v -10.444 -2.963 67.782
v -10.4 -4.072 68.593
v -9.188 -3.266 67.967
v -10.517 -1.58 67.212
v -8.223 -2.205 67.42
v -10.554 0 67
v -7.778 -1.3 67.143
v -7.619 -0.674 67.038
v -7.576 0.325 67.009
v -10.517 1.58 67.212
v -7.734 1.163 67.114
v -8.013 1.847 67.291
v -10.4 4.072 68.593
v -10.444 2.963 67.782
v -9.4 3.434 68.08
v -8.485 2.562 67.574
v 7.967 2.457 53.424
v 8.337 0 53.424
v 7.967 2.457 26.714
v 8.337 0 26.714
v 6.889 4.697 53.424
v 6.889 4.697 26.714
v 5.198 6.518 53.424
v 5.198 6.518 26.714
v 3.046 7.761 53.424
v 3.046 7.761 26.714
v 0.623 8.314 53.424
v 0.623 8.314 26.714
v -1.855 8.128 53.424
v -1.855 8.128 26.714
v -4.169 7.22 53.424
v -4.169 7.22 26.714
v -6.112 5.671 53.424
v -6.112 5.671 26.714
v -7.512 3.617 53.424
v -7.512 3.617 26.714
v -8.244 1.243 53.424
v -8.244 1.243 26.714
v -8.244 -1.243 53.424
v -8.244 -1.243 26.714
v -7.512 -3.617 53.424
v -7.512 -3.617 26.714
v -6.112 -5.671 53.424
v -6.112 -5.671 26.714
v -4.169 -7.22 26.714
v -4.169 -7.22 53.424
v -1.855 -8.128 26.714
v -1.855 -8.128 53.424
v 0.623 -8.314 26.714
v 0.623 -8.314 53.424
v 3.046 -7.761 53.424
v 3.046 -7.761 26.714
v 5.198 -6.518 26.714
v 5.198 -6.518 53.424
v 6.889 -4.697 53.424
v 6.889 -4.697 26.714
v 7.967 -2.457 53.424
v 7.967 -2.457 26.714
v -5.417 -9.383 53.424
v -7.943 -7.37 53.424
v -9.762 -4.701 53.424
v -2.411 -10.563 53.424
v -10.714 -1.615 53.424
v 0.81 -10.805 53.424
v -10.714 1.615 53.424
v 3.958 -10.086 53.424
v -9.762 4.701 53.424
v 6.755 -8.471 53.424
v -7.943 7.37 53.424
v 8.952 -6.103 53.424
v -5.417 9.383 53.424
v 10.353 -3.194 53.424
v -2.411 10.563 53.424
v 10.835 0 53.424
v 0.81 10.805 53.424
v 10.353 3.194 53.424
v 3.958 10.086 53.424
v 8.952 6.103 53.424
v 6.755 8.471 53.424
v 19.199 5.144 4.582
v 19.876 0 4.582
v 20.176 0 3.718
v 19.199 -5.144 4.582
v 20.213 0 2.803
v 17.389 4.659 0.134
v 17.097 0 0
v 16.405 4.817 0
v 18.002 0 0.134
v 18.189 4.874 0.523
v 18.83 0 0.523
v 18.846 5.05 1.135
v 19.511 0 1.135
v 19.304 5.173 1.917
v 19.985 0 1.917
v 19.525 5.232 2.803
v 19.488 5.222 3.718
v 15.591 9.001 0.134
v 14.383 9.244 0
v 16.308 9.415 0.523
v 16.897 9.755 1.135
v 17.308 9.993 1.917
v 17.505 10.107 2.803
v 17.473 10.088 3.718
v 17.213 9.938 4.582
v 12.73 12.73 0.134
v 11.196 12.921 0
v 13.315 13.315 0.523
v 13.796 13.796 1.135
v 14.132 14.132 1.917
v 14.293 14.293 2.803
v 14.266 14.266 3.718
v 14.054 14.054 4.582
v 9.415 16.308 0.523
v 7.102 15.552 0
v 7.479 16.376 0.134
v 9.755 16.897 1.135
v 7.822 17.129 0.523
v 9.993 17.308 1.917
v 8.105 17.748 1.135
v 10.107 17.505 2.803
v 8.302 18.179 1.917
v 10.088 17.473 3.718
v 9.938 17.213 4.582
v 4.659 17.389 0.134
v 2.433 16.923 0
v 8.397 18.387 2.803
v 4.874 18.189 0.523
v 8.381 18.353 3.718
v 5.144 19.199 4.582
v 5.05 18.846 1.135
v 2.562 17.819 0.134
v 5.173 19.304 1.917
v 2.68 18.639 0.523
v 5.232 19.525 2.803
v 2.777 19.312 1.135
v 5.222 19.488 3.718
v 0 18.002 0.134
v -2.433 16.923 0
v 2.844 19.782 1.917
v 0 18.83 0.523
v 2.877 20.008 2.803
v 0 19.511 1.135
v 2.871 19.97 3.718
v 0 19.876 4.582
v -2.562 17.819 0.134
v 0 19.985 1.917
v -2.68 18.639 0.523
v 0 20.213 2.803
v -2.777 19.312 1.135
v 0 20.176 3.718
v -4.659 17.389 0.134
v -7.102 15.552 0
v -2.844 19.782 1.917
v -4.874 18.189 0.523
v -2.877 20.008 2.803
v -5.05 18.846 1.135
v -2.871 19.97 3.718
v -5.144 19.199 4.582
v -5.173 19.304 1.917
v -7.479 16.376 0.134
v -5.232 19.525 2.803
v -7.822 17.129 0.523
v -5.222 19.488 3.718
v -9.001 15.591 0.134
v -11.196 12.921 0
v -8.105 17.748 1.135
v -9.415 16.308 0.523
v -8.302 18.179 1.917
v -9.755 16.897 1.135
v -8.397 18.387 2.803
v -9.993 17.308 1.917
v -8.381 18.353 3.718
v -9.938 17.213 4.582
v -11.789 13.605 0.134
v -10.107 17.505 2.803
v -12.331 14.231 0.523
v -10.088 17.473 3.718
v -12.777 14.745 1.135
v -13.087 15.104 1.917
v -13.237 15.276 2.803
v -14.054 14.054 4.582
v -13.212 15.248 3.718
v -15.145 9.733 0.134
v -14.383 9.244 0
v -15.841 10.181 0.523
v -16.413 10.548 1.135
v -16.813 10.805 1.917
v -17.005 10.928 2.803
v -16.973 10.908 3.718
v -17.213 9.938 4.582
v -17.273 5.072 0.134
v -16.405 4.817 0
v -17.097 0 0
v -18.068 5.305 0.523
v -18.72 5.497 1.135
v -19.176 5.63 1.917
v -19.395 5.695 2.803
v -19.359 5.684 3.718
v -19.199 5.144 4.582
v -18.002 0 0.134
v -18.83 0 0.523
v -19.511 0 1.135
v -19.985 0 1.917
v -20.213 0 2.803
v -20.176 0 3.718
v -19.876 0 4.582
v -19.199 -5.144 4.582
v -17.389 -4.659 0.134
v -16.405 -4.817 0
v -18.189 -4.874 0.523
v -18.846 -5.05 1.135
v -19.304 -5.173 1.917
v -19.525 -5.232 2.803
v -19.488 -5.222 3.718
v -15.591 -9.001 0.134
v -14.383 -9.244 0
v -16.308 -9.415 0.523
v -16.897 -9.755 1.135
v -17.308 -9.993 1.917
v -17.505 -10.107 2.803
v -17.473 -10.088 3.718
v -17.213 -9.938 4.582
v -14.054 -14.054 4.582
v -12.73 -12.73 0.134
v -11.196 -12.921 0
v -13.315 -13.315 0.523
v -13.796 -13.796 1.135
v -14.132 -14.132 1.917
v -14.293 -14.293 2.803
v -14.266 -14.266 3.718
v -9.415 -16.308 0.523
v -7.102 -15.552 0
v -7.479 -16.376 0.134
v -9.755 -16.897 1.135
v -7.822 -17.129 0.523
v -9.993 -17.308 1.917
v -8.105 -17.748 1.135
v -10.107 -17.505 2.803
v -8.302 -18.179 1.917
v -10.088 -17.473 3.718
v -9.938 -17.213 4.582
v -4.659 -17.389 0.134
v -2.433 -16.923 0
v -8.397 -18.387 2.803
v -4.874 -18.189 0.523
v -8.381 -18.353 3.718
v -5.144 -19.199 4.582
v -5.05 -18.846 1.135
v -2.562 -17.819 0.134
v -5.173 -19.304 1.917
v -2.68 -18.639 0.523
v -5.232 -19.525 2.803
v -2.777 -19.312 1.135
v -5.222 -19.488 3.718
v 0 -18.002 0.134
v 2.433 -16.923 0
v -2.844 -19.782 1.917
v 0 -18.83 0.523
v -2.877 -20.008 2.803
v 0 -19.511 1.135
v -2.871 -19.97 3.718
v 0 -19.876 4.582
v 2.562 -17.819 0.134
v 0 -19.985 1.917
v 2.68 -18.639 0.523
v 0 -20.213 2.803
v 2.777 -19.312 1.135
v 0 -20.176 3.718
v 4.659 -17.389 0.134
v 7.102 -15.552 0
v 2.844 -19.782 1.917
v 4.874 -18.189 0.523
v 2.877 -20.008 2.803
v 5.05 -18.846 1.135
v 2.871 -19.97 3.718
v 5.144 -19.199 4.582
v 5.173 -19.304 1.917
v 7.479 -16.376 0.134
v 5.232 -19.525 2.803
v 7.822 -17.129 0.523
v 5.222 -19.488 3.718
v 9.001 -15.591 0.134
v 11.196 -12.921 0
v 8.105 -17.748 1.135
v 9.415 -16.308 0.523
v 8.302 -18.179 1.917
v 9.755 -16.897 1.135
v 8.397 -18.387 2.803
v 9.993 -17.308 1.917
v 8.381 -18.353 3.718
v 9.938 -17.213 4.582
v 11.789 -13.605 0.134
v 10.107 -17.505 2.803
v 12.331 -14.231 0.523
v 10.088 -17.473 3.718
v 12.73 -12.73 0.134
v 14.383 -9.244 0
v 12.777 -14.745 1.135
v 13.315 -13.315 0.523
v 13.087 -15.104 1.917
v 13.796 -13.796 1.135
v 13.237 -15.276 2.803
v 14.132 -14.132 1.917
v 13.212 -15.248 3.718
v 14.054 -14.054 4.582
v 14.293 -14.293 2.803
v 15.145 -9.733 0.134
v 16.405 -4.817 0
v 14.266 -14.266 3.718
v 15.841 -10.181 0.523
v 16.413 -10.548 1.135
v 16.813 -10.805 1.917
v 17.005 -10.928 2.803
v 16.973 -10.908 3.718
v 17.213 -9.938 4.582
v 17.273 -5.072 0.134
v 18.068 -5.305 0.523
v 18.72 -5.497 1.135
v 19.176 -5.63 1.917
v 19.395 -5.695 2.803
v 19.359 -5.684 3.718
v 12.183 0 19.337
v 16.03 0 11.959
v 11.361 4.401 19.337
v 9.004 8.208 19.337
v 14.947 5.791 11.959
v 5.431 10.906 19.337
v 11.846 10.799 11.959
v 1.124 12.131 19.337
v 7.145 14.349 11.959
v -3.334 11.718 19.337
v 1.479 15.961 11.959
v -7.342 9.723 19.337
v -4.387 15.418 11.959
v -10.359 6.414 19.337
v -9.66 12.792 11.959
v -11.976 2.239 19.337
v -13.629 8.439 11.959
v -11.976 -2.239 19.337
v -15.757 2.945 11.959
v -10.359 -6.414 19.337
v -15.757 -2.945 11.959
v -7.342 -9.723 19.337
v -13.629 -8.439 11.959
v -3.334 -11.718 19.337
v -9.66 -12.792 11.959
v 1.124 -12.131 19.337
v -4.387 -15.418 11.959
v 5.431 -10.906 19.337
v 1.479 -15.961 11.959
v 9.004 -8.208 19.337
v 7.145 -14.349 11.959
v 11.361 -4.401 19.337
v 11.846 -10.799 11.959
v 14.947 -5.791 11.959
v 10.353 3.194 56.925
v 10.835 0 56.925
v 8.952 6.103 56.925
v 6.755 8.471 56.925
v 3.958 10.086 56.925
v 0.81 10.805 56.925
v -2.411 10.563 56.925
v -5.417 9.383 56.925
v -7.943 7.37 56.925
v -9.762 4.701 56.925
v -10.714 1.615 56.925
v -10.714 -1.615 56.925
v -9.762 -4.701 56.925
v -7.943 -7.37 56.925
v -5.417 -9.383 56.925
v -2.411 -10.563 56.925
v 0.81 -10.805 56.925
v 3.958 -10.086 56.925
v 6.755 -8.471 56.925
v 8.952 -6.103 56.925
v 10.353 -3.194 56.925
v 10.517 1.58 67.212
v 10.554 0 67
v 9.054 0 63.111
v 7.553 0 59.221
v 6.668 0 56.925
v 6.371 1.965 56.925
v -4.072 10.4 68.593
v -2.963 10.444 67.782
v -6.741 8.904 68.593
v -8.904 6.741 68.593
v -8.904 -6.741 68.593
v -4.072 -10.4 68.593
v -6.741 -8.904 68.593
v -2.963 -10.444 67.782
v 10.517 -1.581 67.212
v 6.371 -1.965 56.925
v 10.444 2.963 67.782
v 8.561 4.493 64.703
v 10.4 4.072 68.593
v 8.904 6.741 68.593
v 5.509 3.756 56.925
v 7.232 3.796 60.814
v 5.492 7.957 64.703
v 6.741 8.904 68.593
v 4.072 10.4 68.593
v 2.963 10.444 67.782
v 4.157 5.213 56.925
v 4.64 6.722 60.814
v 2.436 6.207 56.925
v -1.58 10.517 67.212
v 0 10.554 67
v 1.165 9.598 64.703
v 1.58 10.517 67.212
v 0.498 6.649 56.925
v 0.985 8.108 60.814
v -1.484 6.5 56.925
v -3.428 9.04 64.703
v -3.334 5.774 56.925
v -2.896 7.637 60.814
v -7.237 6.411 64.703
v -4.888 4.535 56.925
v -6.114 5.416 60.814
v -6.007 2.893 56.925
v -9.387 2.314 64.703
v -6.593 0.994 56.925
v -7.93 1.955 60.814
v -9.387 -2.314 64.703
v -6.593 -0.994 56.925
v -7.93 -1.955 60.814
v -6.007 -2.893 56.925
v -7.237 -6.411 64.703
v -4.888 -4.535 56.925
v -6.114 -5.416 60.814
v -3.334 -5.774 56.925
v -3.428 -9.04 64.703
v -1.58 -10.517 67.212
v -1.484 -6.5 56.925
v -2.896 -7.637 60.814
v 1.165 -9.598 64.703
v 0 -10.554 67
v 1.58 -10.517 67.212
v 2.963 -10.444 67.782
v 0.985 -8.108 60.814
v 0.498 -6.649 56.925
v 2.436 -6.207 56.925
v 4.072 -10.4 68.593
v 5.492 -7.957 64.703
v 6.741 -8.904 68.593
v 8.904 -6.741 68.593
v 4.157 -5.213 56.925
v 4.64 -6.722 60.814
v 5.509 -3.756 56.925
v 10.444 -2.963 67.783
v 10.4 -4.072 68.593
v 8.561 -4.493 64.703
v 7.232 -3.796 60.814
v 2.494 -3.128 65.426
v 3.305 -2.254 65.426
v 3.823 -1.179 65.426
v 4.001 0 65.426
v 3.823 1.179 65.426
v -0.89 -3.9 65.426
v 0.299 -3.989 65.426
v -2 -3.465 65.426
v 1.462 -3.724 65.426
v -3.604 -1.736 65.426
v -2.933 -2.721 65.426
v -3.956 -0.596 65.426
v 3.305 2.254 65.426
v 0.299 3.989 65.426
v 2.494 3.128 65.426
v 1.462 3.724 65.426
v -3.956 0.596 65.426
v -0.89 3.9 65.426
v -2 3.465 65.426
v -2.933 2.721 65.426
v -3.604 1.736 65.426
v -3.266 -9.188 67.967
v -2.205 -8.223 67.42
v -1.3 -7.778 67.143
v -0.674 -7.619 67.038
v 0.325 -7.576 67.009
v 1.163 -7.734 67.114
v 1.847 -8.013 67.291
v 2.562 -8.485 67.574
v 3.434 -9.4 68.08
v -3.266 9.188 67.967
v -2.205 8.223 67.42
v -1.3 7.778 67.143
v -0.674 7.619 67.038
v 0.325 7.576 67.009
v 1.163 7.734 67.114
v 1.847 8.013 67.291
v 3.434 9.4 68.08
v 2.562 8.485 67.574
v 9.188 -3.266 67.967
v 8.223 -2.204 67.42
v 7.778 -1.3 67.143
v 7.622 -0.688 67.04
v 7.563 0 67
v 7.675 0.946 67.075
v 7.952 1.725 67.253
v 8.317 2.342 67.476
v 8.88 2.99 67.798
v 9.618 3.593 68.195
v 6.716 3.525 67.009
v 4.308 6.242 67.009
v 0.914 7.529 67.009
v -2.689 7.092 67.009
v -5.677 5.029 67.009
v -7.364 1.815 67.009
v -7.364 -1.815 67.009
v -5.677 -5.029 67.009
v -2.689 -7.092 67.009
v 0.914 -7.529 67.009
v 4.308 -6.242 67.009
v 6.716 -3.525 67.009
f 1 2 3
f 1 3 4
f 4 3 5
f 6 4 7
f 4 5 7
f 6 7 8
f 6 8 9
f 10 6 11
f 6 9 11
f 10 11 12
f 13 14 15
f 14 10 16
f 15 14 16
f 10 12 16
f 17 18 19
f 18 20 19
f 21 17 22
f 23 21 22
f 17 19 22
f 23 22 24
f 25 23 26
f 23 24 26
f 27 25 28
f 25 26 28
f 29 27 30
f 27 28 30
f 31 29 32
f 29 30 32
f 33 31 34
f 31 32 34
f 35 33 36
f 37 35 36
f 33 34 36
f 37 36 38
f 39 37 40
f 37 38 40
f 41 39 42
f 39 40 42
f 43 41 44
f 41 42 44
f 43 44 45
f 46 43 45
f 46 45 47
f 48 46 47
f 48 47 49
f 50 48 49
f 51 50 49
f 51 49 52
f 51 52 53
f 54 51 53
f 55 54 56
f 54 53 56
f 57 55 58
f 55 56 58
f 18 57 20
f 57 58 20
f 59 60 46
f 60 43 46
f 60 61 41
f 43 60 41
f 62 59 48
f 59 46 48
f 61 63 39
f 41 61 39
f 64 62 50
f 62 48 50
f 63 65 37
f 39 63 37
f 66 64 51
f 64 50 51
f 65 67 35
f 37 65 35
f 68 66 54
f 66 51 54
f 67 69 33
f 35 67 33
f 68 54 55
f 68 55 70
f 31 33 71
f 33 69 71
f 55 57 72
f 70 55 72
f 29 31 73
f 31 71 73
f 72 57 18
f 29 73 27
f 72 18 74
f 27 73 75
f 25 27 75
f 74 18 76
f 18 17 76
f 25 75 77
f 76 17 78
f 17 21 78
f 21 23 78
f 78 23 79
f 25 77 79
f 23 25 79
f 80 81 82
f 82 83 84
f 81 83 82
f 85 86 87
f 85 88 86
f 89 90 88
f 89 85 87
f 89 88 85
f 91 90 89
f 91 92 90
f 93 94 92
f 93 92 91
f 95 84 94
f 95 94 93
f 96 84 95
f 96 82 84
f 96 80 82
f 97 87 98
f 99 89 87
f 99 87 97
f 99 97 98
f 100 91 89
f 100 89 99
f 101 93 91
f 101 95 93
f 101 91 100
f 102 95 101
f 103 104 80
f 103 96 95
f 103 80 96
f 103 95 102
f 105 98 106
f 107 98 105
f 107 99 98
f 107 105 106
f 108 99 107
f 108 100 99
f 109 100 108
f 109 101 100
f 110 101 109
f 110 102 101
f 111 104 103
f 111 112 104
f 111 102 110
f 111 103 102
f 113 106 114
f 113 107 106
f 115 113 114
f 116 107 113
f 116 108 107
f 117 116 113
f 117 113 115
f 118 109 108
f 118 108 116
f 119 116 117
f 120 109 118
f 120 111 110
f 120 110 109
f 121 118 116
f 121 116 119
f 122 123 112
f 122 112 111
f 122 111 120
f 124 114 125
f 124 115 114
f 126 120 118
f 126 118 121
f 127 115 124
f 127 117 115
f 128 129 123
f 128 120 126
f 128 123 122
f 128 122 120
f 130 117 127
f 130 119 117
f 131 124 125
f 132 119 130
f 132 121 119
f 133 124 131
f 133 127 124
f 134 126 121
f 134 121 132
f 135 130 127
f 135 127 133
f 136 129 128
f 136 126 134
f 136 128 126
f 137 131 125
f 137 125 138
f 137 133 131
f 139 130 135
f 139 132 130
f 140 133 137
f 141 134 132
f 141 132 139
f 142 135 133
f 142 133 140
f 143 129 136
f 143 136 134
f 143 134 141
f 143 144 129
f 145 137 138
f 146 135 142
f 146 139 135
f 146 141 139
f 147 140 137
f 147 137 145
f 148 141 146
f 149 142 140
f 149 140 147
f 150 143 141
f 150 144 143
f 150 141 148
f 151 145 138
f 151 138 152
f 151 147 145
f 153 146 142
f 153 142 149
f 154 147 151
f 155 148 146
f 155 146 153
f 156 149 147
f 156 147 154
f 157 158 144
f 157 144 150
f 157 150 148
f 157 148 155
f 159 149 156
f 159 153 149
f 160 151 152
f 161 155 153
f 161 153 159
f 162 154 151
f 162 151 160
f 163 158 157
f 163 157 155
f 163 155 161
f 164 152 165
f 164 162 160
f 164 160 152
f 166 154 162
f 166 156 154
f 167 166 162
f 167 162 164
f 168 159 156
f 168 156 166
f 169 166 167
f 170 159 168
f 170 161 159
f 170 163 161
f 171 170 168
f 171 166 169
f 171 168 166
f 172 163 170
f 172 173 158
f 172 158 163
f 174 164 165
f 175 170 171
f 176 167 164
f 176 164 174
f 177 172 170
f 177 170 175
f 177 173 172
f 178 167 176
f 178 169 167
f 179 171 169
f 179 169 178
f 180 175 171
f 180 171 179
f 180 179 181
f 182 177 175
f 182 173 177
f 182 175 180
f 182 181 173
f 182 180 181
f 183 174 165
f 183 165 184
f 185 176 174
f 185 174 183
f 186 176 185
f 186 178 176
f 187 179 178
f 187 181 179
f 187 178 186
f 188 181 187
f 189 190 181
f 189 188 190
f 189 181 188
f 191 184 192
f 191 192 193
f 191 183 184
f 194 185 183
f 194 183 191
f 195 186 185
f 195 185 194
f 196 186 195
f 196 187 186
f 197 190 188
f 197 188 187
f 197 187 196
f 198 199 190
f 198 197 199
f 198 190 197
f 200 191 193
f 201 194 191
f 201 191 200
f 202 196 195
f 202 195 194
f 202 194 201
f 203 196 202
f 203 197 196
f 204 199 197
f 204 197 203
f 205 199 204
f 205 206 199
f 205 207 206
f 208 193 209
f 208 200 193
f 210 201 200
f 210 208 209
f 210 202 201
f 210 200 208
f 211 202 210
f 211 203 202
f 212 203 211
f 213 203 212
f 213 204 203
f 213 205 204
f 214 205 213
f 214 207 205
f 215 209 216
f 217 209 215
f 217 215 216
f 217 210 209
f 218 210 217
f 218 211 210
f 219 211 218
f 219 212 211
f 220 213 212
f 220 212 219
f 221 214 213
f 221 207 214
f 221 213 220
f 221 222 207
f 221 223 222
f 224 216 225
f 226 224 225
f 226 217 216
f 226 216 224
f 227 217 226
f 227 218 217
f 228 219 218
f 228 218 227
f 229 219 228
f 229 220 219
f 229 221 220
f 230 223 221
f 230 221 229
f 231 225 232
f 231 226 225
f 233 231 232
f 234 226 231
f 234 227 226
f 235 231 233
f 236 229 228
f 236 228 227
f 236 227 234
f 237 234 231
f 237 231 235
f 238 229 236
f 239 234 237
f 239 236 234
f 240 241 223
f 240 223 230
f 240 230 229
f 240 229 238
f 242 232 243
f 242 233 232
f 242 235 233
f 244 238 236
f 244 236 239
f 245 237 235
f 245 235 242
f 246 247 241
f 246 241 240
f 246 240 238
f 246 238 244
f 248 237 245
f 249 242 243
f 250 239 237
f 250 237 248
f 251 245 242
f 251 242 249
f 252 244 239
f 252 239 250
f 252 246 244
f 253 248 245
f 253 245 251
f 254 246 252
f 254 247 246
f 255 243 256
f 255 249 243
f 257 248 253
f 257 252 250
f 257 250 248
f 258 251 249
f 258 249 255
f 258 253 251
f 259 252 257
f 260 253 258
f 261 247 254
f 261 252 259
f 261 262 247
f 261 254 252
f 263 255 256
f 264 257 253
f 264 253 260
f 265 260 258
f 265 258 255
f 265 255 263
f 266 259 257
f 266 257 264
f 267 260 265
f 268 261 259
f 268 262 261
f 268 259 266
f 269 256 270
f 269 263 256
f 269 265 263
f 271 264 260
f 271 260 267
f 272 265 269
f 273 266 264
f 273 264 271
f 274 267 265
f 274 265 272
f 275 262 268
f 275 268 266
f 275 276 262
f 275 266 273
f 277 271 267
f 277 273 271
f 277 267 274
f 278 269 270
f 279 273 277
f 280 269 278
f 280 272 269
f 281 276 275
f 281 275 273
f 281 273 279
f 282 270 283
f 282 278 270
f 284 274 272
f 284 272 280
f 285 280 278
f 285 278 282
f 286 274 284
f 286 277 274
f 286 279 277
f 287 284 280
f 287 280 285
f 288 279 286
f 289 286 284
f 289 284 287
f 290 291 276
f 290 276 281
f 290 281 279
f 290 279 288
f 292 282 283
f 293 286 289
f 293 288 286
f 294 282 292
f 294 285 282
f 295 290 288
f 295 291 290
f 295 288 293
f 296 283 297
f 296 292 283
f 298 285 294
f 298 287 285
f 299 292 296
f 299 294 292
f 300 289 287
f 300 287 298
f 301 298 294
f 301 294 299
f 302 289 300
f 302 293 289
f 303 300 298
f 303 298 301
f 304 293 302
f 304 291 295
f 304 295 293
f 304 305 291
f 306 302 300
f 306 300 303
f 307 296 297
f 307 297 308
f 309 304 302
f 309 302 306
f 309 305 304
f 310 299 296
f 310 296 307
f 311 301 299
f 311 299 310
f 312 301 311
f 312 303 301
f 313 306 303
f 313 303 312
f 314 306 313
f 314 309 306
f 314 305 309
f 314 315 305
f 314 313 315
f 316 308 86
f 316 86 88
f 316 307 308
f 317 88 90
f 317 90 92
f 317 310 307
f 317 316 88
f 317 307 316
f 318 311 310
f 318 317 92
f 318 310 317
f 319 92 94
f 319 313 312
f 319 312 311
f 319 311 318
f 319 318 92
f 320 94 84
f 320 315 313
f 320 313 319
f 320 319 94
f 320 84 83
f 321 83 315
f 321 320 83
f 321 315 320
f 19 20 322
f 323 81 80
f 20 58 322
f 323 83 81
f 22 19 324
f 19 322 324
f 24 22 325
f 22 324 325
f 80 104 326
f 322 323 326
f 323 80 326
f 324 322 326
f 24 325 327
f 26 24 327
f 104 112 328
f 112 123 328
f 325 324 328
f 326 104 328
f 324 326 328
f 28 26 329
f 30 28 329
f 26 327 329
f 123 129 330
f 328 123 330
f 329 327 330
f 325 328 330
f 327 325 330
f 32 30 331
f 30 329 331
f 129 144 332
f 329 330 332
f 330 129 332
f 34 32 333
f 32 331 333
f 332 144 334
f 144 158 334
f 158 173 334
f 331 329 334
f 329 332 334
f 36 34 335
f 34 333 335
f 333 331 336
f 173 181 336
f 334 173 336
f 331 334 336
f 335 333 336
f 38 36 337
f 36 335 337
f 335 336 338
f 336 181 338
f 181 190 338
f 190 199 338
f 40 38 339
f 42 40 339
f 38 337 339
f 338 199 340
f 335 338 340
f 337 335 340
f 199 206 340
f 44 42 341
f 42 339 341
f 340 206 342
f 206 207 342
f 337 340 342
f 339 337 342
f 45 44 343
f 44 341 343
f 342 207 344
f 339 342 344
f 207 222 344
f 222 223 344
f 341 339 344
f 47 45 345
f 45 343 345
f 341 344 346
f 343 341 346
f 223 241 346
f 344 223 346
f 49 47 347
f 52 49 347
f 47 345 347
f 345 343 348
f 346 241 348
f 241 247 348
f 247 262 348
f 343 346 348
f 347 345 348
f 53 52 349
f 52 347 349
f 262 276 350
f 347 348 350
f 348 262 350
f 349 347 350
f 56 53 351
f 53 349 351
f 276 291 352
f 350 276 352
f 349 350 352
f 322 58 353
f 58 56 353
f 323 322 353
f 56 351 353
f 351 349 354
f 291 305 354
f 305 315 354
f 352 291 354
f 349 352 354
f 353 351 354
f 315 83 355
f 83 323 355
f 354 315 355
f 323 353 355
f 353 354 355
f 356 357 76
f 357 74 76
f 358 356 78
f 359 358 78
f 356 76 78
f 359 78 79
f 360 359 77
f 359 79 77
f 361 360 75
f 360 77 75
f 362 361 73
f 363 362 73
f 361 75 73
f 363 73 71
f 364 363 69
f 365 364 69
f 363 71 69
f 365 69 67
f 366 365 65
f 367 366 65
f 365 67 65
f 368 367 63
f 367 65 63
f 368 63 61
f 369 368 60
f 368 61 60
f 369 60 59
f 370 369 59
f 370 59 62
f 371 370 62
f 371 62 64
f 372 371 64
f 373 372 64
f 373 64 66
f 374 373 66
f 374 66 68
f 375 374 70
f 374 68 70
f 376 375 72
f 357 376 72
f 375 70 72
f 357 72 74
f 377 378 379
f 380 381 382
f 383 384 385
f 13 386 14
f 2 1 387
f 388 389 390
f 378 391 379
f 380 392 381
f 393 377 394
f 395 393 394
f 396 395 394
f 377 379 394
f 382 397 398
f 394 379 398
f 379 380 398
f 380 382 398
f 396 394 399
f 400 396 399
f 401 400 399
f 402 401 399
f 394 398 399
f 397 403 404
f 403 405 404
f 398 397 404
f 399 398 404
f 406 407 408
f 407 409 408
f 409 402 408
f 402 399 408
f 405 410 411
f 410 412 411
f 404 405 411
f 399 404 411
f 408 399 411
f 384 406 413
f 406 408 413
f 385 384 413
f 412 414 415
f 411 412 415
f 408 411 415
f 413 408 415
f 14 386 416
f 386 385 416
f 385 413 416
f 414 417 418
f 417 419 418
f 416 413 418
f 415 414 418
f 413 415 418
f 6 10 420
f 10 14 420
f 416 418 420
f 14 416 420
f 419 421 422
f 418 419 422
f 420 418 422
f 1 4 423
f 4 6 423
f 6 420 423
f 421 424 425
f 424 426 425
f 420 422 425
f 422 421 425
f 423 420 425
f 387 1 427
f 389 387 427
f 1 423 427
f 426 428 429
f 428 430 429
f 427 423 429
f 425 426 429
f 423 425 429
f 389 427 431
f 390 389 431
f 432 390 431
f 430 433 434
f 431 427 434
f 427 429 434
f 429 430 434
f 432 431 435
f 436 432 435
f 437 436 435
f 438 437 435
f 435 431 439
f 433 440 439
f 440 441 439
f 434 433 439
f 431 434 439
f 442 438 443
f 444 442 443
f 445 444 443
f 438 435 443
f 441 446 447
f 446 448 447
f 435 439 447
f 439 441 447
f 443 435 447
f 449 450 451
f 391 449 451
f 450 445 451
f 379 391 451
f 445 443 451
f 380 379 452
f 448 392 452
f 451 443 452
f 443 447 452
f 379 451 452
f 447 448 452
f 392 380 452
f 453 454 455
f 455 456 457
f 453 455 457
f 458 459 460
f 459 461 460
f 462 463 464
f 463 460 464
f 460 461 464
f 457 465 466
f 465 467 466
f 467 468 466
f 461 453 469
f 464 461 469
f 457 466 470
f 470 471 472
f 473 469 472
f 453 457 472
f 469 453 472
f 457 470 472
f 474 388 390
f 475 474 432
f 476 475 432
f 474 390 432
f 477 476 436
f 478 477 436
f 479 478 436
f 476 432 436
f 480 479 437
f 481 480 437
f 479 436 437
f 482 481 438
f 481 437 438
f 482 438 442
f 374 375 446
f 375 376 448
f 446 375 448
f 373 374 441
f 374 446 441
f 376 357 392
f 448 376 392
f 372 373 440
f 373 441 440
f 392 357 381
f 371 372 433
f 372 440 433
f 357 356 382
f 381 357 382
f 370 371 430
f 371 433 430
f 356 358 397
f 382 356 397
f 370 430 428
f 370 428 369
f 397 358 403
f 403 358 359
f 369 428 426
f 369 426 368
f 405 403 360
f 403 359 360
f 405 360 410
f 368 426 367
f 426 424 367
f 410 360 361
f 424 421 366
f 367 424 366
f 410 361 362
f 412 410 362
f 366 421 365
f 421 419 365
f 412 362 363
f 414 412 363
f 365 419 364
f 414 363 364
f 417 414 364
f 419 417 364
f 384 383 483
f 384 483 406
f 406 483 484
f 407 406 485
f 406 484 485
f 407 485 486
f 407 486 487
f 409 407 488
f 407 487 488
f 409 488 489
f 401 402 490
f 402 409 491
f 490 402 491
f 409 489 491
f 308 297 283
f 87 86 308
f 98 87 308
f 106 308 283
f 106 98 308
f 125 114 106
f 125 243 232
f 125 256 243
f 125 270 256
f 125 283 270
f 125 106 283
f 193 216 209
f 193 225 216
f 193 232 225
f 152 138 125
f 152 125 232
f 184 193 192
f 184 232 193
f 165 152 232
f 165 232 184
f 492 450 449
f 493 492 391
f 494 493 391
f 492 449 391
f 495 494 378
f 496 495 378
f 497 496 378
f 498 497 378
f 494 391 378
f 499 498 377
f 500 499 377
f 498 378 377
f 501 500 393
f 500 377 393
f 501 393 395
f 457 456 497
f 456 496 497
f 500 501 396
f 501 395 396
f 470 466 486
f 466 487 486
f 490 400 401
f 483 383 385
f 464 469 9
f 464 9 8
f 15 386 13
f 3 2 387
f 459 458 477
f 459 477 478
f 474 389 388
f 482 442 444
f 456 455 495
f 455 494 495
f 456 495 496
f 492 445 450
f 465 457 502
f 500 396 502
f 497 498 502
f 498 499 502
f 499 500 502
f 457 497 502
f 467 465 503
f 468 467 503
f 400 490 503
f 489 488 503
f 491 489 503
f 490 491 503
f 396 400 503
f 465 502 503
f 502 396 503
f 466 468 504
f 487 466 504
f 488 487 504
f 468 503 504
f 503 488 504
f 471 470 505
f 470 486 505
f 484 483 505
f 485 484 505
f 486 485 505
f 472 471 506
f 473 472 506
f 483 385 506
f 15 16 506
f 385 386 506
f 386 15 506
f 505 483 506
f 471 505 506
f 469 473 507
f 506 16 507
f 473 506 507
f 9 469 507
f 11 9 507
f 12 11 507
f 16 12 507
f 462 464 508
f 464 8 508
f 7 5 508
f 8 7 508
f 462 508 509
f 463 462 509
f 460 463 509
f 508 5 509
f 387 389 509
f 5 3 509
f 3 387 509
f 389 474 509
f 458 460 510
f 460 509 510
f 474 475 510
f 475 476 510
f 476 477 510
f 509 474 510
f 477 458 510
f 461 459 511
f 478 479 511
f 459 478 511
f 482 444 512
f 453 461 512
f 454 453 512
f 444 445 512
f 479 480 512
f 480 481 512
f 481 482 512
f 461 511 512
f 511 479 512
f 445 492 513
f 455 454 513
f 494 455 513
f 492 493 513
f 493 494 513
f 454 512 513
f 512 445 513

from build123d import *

# Parameters (mm, degrees)
SKETCH003_R  = 6
PAD001_DEPTH = 22.5
SKETCH001_R  = 6
PAD_DEPTH    = 22.5


with BuildPart() as pad001:
    # Sketch003 → Pad001 (new body, symmetric)
    with BuildSketch(Plane.YZ):
        with Locations((0, 73)):
            Circle(SKETCH003_R)
    extrude(amount=PAD001_DEPTH, both=True)


with BuildPart() as pad:
    # Sketch001 → Pad (new body, symmetric)
    with BuildSketch(Plane.XZ):
        with Locations((0, 73)):
            Circle(SKETCH001_R)
    extrude(amount=PAD_DEPTH, both=True)


with BuildPart() as cut001:
    # Sketch → Revolution (revolve)
    with BuildSketch(Plane.XZ):
        with BuildLine():
            Line((0, 65.425804), (4.000562, 65.425804))
            Line((4.000562, 65.425804), (11.168226, 68.592918))
            Line((11.168226, 68.592918), (6.667604, 56.924622))
            Line((6.667604, 56.924622), (10.834842, 56.924622))
            Line((10.834842, 56.924622), (10.834842, 53.424126))
            Line((10.834842, 53.424126), (8.337257, 53.424126))
            Line((8.337257, 53.424126), (8.337257, 26.713955))
            Line((8.337257, 26.713955), (19.875788, 4.581964))
            ThreePointArc((17.097317, 0), (19.776603, 1.508704), (19.875788, 4.581964))
            Line((0, 0), (17.097317, 0))
            Line((0, 65.425804), (0, 0))
        make_face()
    revolve(axis=Axis((0, 0, 0), (0, 0, 1)))

    # Cut: cut Pad
    add(pad.part, mode=Mode.SUBTRACT)

    # Cut001: cut Pad001
    add(pad001.part, mode=Mode.SUBTRACT)


solid = cut001.part
